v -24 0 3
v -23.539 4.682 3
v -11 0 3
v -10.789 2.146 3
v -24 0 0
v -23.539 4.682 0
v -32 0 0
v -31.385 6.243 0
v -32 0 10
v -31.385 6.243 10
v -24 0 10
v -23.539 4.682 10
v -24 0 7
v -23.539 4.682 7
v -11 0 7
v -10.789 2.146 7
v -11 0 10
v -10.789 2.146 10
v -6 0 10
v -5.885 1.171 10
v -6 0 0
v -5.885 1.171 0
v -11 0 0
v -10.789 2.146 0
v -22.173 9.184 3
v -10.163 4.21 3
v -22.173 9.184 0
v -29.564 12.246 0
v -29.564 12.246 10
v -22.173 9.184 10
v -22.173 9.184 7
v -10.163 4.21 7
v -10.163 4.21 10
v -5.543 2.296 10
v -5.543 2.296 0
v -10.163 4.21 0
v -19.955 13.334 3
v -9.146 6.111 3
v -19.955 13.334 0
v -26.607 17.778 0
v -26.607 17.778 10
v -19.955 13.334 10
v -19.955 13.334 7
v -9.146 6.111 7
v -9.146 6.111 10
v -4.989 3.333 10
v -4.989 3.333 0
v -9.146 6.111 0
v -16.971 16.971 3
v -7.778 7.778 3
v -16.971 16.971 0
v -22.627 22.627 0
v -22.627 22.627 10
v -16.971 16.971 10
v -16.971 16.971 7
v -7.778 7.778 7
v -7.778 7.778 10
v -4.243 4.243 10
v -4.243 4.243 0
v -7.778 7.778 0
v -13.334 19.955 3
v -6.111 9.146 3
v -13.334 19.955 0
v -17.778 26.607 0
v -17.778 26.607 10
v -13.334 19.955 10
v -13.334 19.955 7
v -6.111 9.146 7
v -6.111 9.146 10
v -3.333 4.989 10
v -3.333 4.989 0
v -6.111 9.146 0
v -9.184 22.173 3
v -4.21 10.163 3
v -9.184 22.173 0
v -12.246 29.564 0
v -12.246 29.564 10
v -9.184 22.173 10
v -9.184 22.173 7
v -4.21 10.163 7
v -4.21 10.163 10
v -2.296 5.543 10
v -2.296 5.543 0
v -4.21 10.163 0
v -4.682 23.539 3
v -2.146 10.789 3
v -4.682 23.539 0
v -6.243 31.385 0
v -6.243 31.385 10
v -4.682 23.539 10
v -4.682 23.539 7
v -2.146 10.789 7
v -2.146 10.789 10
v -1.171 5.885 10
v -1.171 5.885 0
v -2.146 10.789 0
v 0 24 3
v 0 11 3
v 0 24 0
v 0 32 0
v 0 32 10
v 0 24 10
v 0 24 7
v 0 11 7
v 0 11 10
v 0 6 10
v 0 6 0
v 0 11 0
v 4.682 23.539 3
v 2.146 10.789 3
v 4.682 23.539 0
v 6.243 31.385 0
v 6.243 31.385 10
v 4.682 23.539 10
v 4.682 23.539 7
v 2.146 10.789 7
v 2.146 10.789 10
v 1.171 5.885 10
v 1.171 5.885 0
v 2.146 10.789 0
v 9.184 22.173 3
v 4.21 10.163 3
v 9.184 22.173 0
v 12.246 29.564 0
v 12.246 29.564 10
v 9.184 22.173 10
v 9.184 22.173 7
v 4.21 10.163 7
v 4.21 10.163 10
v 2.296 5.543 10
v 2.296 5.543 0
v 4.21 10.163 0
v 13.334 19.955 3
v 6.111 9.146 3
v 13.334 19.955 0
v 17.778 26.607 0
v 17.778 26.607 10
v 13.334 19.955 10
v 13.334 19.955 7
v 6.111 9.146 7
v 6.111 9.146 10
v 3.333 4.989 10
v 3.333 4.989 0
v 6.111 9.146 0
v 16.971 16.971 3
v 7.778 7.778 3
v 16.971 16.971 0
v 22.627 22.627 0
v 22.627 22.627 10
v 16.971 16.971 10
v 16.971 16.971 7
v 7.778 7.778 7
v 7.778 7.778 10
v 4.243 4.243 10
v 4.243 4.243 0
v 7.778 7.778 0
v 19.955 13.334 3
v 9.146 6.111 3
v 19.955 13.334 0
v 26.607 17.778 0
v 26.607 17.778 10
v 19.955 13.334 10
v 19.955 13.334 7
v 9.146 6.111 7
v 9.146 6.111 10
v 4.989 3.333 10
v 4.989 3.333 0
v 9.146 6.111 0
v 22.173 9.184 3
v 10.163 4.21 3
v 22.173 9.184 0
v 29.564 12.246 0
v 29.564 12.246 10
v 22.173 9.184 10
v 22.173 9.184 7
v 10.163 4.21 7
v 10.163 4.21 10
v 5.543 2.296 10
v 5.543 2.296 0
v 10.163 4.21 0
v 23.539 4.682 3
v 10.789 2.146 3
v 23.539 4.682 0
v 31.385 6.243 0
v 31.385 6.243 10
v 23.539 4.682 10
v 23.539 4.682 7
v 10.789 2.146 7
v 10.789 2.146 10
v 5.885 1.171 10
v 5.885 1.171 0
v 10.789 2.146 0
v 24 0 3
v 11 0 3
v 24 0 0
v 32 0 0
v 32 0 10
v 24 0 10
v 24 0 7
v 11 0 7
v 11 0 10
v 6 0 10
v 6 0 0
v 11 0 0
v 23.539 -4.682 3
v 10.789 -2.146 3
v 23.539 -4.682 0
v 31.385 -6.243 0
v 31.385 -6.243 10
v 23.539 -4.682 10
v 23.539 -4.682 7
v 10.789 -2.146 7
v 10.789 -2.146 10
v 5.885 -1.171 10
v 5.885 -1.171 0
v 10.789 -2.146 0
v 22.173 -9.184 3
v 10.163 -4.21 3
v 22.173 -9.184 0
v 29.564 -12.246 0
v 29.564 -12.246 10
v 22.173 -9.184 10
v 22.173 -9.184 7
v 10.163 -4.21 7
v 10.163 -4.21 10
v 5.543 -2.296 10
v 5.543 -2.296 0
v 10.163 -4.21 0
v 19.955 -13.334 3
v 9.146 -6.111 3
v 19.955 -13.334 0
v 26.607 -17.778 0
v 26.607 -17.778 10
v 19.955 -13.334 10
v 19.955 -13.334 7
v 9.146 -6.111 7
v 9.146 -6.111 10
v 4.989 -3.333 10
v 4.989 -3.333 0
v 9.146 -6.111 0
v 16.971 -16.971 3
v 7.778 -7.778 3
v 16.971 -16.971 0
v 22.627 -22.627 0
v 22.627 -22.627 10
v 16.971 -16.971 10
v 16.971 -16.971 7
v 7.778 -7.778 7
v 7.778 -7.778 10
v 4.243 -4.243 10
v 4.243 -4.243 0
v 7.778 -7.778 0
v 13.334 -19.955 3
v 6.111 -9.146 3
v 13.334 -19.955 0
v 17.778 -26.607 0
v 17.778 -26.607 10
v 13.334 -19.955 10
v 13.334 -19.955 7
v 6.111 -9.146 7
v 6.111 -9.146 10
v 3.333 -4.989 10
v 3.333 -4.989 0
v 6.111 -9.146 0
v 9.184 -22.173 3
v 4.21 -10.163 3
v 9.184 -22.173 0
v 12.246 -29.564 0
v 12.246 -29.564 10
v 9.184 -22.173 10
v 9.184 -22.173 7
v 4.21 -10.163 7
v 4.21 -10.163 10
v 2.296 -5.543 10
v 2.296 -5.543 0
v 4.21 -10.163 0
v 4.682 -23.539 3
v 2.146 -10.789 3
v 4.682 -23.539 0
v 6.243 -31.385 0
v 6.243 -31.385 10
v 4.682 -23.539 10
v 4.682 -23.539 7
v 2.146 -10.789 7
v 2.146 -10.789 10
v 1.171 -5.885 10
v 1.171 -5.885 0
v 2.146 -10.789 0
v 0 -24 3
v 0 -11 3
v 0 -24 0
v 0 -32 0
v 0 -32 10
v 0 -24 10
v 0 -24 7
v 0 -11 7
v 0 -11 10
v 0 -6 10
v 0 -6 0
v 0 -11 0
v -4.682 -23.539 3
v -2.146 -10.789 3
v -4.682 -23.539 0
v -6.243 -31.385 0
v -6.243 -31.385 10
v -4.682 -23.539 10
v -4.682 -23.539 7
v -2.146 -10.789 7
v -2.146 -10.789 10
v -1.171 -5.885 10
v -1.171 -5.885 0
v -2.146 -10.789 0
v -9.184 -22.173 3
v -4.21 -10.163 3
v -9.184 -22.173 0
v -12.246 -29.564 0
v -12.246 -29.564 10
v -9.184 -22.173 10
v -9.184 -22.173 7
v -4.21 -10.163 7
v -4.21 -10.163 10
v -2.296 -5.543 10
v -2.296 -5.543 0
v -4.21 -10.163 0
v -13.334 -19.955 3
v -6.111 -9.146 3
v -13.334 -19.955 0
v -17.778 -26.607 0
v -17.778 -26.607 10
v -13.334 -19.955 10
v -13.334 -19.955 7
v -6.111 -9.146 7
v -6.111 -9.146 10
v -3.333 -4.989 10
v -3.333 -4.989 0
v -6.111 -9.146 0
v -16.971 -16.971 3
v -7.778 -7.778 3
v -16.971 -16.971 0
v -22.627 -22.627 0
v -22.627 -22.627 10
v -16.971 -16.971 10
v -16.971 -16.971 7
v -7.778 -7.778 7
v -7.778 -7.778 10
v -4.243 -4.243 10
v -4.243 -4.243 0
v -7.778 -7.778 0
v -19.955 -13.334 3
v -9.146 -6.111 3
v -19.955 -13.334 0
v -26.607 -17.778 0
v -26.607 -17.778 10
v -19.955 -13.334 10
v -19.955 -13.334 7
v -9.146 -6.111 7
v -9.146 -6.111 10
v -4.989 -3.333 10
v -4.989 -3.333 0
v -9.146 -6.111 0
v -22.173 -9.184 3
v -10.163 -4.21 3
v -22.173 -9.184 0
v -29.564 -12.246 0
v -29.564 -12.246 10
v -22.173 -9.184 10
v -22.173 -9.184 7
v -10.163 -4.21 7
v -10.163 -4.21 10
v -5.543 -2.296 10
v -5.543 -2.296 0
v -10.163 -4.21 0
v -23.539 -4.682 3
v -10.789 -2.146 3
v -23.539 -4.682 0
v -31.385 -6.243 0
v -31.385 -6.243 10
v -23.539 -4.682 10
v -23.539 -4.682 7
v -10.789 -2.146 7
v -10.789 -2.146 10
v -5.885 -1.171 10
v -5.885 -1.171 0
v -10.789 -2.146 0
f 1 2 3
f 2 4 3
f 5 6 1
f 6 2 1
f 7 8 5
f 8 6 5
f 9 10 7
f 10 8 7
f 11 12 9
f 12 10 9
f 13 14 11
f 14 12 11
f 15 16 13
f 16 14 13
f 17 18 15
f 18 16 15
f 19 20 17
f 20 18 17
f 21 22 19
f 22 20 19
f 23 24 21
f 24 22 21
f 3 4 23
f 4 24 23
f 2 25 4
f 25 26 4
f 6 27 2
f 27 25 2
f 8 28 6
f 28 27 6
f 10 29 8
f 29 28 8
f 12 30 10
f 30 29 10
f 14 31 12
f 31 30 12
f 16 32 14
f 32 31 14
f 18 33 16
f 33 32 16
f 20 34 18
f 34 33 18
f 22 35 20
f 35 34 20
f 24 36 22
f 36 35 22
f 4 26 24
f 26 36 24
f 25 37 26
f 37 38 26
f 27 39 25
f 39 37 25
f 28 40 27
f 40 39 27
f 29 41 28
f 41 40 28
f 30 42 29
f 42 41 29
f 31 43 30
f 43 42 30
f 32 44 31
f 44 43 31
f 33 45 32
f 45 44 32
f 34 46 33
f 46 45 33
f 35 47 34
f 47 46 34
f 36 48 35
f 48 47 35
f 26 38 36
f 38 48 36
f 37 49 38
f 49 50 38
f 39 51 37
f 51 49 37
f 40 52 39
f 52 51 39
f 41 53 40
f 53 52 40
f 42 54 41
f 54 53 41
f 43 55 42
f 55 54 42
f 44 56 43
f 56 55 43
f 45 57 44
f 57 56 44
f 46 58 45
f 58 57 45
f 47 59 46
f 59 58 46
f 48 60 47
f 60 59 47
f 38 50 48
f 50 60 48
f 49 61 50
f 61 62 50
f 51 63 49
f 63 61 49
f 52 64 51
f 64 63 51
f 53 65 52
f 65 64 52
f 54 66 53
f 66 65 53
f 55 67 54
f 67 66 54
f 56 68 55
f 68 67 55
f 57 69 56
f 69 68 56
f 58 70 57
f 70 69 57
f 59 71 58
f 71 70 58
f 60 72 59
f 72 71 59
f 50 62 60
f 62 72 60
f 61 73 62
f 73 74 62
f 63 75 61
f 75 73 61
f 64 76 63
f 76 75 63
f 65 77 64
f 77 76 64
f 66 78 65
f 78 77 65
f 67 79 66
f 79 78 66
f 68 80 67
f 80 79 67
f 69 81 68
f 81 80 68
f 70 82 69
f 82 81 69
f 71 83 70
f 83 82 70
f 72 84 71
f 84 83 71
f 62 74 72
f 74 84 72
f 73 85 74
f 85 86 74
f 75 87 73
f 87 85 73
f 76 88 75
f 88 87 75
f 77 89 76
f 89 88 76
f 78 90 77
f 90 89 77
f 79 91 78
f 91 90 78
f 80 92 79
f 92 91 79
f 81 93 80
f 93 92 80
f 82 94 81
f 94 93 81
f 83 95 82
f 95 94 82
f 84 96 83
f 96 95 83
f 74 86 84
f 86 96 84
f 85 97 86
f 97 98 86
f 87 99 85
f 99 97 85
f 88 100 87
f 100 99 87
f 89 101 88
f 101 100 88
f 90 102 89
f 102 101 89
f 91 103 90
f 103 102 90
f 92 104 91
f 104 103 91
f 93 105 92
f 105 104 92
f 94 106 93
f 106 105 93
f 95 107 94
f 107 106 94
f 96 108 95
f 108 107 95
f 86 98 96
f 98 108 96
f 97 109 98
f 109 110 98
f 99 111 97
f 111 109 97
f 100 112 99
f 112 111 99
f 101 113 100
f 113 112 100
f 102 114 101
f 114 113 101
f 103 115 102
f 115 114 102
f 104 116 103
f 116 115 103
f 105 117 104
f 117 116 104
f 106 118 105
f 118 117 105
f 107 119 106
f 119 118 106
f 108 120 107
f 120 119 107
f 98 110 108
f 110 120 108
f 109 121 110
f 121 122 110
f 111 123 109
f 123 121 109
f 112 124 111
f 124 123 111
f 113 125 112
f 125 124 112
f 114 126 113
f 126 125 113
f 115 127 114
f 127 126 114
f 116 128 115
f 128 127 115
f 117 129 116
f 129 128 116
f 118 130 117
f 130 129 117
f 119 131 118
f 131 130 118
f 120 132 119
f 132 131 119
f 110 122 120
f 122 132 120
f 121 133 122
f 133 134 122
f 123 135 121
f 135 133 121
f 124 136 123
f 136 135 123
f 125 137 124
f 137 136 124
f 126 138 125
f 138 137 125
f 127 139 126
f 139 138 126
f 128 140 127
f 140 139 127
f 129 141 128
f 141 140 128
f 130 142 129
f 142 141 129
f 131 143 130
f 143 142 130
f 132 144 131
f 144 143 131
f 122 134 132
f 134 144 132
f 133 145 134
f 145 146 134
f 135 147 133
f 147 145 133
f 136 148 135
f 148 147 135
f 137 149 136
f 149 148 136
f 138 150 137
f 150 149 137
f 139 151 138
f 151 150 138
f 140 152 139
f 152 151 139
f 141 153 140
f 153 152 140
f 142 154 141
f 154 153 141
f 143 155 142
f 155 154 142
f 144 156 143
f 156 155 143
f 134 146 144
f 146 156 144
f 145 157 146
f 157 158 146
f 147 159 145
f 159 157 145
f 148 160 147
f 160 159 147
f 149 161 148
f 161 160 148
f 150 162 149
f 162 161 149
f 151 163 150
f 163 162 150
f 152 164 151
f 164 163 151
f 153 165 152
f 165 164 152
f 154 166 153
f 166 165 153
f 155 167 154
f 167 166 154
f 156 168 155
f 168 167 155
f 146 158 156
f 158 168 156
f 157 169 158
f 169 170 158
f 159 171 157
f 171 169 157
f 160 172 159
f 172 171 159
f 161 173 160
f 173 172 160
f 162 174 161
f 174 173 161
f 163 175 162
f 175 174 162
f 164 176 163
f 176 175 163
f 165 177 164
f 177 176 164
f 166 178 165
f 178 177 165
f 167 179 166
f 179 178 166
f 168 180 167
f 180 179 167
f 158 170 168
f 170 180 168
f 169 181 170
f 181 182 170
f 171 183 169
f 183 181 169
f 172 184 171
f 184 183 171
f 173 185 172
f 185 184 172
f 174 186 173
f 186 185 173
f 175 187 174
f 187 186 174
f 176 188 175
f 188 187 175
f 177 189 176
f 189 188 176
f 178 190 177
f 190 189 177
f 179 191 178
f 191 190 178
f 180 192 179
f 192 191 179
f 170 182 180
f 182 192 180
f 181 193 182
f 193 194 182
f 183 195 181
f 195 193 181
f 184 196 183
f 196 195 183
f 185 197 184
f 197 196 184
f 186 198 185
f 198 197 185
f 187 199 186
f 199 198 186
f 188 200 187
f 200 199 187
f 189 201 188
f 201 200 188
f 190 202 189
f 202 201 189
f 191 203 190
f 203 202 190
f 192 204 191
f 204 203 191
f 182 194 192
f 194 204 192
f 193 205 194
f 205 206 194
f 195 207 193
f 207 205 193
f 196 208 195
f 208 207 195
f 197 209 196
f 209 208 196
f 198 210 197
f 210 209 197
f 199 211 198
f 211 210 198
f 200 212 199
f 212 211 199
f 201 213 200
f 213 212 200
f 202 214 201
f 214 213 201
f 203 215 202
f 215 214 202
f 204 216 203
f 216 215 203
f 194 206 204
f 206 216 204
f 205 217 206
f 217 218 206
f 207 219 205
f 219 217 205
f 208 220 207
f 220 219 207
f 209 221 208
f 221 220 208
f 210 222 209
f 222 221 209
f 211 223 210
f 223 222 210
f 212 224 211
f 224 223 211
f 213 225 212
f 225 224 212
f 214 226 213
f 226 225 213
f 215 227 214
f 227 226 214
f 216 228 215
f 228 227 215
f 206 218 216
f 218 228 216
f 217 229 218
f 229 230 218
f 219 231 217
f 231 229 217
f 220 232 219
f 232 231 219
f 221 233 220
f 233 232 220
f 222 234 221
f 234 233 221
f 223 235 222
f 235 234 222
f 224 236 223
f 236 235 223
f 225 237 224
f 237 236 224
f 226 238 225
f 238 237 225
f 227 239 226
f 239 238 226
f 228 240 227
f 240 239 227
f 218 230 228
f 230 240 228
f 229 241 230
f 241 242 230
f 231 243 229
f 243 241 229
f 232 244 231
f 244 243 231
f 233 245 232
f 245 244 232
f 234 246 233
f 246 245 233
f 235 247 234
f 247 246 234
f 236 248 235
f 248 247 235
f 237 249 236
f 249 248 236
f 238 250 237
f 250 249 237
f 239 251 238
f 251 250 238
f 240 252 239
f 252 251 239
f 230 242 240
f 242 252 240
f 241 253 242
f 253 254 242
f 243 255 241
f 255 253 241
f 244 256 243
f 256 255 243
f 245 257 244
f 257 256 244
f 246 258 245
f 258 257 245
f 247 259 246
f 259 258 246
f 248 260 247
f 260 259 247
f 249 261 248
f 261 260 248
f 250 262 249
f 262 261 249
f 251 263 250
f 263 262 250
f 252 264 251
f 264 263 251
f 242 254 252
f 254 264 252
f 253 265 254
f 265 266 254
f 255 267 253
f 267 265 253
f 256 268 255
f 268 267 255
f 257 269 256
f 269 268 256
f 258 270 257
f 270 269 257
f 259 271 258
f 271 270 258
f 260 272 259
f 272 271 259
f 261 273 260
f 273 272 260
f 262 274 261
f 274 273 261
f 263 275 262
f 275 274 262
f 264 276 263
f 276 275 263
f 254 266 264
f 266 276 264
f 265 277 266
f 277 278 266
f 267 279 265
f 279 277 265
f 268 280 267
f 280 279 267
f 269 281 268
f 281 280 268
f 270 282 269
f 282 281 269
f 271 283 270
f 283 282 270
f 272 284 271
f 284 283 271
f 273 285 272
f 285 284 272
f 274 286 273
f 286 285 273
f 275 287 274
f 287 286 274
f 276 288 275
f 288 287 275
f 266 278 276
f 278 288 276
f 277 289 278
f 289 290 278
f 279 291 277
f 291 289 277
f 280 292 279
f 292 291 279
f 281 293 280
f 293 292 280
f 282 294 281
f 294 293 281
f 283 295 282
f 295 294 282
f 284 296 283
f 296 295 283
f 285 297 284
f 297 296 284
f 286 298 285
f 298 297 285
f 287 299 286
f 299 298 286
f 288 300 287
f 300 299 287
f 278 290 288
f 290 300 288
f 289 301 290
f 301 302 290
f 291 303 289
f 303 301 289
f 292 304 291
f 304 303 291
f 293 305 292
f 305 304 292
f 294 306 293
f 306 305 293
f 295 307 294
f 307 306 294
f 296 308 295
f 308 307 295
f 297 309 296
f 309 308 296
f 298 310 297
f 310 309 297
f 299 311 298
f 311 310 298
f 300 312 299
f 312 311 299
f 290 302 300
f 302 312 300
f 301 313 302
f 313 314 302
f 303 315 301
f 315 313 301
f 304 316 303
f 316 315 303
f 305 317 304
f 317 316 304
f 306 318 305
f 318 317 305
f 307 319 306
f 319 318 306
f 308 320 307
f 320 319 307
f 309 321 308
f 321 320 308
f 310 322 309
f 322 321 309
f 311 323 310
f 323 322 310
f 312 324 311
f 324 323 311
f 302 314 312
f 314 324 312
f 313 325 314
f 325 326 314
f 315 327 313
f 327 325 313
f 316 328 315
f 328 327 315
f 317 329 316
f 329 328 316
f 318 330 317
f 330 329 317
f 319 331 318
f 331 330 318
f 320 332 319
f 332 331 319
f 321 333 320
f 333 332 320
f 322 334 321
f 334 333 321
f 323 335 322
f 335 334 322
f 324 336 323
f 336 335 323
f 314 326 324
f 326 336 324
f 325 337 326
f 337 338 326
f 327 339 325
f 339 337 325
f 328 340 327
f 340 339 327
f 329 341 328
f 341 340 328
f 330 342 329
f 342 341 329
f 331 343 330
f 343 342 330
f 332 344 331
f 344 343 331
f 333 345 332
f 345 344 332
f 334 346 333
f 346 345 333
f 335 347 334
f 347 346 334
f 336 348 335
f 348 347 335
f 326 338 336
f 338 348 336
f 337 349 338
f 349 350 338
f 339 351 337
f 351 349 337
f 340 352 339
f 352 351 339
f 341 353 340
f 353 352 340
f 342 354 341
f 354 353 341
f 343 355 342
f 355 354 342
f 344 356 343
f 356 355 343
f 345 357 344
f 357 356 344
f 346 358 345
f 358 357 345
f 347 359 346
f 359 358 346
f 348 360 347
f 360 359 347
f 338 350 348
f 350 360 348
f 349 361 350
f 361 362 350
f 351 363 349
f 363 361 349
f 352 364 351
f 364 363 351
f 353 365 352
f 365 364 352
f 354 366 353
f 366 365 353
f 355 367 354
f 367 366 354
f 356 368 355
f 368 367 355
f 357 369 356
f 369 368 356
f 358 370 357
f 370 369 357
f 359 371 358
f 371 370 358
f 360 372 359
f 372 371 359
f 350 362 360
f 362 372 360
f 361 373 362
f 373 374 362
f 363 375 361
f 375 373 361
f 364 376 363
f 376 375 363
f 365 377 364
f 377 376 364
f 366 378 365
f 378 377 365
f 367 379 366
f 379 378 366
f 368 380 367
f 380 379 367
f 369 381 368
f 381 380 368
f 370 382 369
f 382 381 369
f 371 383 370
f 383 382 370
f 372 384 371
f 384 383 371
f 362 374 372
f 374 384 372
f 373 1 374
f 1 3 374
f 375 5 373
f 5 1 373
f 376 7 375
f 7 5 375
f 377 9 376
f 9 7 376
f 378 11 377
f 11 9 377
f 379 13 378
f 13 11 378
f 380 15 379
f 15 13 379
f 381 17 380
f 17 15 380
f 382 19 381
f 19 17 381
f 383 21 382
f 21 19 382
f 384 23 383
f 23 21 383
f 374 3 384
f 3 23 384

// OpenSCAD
$fn = 32;

// ----------------------------------------------------------------------
// Revolved part: handwheel R32
// ----------------------------------------------------------------------

// --- parameters (mm) ---
bore_r = 6;               // bore radius
rim_r = 32;               // rim radius
rim_w = 8;                // rim axial width
rim_t = 10;               // rim diameter height
hub_r = 11;               // hub radius
web_t = 4;                // web thickness
revolve_angle = 360;      // revolve sweep, degrees

bore_d = 2 * bore_r;
rim_d = 2 * rim_r;
hub_d = 2 * hub_r;

profile = [[6, 0], [11, 0], [11, 3], [24, 3], [24, 0], [32, 0], [32, 10], [24, 10], [24, 7], [11, 7], [11, 10], [6, 10]];  // primary outline, 12 points, counter clockwise

// --- the one profile operation ---
rotate_extrude(angle = revolve_angle) polygon(points = profile);
